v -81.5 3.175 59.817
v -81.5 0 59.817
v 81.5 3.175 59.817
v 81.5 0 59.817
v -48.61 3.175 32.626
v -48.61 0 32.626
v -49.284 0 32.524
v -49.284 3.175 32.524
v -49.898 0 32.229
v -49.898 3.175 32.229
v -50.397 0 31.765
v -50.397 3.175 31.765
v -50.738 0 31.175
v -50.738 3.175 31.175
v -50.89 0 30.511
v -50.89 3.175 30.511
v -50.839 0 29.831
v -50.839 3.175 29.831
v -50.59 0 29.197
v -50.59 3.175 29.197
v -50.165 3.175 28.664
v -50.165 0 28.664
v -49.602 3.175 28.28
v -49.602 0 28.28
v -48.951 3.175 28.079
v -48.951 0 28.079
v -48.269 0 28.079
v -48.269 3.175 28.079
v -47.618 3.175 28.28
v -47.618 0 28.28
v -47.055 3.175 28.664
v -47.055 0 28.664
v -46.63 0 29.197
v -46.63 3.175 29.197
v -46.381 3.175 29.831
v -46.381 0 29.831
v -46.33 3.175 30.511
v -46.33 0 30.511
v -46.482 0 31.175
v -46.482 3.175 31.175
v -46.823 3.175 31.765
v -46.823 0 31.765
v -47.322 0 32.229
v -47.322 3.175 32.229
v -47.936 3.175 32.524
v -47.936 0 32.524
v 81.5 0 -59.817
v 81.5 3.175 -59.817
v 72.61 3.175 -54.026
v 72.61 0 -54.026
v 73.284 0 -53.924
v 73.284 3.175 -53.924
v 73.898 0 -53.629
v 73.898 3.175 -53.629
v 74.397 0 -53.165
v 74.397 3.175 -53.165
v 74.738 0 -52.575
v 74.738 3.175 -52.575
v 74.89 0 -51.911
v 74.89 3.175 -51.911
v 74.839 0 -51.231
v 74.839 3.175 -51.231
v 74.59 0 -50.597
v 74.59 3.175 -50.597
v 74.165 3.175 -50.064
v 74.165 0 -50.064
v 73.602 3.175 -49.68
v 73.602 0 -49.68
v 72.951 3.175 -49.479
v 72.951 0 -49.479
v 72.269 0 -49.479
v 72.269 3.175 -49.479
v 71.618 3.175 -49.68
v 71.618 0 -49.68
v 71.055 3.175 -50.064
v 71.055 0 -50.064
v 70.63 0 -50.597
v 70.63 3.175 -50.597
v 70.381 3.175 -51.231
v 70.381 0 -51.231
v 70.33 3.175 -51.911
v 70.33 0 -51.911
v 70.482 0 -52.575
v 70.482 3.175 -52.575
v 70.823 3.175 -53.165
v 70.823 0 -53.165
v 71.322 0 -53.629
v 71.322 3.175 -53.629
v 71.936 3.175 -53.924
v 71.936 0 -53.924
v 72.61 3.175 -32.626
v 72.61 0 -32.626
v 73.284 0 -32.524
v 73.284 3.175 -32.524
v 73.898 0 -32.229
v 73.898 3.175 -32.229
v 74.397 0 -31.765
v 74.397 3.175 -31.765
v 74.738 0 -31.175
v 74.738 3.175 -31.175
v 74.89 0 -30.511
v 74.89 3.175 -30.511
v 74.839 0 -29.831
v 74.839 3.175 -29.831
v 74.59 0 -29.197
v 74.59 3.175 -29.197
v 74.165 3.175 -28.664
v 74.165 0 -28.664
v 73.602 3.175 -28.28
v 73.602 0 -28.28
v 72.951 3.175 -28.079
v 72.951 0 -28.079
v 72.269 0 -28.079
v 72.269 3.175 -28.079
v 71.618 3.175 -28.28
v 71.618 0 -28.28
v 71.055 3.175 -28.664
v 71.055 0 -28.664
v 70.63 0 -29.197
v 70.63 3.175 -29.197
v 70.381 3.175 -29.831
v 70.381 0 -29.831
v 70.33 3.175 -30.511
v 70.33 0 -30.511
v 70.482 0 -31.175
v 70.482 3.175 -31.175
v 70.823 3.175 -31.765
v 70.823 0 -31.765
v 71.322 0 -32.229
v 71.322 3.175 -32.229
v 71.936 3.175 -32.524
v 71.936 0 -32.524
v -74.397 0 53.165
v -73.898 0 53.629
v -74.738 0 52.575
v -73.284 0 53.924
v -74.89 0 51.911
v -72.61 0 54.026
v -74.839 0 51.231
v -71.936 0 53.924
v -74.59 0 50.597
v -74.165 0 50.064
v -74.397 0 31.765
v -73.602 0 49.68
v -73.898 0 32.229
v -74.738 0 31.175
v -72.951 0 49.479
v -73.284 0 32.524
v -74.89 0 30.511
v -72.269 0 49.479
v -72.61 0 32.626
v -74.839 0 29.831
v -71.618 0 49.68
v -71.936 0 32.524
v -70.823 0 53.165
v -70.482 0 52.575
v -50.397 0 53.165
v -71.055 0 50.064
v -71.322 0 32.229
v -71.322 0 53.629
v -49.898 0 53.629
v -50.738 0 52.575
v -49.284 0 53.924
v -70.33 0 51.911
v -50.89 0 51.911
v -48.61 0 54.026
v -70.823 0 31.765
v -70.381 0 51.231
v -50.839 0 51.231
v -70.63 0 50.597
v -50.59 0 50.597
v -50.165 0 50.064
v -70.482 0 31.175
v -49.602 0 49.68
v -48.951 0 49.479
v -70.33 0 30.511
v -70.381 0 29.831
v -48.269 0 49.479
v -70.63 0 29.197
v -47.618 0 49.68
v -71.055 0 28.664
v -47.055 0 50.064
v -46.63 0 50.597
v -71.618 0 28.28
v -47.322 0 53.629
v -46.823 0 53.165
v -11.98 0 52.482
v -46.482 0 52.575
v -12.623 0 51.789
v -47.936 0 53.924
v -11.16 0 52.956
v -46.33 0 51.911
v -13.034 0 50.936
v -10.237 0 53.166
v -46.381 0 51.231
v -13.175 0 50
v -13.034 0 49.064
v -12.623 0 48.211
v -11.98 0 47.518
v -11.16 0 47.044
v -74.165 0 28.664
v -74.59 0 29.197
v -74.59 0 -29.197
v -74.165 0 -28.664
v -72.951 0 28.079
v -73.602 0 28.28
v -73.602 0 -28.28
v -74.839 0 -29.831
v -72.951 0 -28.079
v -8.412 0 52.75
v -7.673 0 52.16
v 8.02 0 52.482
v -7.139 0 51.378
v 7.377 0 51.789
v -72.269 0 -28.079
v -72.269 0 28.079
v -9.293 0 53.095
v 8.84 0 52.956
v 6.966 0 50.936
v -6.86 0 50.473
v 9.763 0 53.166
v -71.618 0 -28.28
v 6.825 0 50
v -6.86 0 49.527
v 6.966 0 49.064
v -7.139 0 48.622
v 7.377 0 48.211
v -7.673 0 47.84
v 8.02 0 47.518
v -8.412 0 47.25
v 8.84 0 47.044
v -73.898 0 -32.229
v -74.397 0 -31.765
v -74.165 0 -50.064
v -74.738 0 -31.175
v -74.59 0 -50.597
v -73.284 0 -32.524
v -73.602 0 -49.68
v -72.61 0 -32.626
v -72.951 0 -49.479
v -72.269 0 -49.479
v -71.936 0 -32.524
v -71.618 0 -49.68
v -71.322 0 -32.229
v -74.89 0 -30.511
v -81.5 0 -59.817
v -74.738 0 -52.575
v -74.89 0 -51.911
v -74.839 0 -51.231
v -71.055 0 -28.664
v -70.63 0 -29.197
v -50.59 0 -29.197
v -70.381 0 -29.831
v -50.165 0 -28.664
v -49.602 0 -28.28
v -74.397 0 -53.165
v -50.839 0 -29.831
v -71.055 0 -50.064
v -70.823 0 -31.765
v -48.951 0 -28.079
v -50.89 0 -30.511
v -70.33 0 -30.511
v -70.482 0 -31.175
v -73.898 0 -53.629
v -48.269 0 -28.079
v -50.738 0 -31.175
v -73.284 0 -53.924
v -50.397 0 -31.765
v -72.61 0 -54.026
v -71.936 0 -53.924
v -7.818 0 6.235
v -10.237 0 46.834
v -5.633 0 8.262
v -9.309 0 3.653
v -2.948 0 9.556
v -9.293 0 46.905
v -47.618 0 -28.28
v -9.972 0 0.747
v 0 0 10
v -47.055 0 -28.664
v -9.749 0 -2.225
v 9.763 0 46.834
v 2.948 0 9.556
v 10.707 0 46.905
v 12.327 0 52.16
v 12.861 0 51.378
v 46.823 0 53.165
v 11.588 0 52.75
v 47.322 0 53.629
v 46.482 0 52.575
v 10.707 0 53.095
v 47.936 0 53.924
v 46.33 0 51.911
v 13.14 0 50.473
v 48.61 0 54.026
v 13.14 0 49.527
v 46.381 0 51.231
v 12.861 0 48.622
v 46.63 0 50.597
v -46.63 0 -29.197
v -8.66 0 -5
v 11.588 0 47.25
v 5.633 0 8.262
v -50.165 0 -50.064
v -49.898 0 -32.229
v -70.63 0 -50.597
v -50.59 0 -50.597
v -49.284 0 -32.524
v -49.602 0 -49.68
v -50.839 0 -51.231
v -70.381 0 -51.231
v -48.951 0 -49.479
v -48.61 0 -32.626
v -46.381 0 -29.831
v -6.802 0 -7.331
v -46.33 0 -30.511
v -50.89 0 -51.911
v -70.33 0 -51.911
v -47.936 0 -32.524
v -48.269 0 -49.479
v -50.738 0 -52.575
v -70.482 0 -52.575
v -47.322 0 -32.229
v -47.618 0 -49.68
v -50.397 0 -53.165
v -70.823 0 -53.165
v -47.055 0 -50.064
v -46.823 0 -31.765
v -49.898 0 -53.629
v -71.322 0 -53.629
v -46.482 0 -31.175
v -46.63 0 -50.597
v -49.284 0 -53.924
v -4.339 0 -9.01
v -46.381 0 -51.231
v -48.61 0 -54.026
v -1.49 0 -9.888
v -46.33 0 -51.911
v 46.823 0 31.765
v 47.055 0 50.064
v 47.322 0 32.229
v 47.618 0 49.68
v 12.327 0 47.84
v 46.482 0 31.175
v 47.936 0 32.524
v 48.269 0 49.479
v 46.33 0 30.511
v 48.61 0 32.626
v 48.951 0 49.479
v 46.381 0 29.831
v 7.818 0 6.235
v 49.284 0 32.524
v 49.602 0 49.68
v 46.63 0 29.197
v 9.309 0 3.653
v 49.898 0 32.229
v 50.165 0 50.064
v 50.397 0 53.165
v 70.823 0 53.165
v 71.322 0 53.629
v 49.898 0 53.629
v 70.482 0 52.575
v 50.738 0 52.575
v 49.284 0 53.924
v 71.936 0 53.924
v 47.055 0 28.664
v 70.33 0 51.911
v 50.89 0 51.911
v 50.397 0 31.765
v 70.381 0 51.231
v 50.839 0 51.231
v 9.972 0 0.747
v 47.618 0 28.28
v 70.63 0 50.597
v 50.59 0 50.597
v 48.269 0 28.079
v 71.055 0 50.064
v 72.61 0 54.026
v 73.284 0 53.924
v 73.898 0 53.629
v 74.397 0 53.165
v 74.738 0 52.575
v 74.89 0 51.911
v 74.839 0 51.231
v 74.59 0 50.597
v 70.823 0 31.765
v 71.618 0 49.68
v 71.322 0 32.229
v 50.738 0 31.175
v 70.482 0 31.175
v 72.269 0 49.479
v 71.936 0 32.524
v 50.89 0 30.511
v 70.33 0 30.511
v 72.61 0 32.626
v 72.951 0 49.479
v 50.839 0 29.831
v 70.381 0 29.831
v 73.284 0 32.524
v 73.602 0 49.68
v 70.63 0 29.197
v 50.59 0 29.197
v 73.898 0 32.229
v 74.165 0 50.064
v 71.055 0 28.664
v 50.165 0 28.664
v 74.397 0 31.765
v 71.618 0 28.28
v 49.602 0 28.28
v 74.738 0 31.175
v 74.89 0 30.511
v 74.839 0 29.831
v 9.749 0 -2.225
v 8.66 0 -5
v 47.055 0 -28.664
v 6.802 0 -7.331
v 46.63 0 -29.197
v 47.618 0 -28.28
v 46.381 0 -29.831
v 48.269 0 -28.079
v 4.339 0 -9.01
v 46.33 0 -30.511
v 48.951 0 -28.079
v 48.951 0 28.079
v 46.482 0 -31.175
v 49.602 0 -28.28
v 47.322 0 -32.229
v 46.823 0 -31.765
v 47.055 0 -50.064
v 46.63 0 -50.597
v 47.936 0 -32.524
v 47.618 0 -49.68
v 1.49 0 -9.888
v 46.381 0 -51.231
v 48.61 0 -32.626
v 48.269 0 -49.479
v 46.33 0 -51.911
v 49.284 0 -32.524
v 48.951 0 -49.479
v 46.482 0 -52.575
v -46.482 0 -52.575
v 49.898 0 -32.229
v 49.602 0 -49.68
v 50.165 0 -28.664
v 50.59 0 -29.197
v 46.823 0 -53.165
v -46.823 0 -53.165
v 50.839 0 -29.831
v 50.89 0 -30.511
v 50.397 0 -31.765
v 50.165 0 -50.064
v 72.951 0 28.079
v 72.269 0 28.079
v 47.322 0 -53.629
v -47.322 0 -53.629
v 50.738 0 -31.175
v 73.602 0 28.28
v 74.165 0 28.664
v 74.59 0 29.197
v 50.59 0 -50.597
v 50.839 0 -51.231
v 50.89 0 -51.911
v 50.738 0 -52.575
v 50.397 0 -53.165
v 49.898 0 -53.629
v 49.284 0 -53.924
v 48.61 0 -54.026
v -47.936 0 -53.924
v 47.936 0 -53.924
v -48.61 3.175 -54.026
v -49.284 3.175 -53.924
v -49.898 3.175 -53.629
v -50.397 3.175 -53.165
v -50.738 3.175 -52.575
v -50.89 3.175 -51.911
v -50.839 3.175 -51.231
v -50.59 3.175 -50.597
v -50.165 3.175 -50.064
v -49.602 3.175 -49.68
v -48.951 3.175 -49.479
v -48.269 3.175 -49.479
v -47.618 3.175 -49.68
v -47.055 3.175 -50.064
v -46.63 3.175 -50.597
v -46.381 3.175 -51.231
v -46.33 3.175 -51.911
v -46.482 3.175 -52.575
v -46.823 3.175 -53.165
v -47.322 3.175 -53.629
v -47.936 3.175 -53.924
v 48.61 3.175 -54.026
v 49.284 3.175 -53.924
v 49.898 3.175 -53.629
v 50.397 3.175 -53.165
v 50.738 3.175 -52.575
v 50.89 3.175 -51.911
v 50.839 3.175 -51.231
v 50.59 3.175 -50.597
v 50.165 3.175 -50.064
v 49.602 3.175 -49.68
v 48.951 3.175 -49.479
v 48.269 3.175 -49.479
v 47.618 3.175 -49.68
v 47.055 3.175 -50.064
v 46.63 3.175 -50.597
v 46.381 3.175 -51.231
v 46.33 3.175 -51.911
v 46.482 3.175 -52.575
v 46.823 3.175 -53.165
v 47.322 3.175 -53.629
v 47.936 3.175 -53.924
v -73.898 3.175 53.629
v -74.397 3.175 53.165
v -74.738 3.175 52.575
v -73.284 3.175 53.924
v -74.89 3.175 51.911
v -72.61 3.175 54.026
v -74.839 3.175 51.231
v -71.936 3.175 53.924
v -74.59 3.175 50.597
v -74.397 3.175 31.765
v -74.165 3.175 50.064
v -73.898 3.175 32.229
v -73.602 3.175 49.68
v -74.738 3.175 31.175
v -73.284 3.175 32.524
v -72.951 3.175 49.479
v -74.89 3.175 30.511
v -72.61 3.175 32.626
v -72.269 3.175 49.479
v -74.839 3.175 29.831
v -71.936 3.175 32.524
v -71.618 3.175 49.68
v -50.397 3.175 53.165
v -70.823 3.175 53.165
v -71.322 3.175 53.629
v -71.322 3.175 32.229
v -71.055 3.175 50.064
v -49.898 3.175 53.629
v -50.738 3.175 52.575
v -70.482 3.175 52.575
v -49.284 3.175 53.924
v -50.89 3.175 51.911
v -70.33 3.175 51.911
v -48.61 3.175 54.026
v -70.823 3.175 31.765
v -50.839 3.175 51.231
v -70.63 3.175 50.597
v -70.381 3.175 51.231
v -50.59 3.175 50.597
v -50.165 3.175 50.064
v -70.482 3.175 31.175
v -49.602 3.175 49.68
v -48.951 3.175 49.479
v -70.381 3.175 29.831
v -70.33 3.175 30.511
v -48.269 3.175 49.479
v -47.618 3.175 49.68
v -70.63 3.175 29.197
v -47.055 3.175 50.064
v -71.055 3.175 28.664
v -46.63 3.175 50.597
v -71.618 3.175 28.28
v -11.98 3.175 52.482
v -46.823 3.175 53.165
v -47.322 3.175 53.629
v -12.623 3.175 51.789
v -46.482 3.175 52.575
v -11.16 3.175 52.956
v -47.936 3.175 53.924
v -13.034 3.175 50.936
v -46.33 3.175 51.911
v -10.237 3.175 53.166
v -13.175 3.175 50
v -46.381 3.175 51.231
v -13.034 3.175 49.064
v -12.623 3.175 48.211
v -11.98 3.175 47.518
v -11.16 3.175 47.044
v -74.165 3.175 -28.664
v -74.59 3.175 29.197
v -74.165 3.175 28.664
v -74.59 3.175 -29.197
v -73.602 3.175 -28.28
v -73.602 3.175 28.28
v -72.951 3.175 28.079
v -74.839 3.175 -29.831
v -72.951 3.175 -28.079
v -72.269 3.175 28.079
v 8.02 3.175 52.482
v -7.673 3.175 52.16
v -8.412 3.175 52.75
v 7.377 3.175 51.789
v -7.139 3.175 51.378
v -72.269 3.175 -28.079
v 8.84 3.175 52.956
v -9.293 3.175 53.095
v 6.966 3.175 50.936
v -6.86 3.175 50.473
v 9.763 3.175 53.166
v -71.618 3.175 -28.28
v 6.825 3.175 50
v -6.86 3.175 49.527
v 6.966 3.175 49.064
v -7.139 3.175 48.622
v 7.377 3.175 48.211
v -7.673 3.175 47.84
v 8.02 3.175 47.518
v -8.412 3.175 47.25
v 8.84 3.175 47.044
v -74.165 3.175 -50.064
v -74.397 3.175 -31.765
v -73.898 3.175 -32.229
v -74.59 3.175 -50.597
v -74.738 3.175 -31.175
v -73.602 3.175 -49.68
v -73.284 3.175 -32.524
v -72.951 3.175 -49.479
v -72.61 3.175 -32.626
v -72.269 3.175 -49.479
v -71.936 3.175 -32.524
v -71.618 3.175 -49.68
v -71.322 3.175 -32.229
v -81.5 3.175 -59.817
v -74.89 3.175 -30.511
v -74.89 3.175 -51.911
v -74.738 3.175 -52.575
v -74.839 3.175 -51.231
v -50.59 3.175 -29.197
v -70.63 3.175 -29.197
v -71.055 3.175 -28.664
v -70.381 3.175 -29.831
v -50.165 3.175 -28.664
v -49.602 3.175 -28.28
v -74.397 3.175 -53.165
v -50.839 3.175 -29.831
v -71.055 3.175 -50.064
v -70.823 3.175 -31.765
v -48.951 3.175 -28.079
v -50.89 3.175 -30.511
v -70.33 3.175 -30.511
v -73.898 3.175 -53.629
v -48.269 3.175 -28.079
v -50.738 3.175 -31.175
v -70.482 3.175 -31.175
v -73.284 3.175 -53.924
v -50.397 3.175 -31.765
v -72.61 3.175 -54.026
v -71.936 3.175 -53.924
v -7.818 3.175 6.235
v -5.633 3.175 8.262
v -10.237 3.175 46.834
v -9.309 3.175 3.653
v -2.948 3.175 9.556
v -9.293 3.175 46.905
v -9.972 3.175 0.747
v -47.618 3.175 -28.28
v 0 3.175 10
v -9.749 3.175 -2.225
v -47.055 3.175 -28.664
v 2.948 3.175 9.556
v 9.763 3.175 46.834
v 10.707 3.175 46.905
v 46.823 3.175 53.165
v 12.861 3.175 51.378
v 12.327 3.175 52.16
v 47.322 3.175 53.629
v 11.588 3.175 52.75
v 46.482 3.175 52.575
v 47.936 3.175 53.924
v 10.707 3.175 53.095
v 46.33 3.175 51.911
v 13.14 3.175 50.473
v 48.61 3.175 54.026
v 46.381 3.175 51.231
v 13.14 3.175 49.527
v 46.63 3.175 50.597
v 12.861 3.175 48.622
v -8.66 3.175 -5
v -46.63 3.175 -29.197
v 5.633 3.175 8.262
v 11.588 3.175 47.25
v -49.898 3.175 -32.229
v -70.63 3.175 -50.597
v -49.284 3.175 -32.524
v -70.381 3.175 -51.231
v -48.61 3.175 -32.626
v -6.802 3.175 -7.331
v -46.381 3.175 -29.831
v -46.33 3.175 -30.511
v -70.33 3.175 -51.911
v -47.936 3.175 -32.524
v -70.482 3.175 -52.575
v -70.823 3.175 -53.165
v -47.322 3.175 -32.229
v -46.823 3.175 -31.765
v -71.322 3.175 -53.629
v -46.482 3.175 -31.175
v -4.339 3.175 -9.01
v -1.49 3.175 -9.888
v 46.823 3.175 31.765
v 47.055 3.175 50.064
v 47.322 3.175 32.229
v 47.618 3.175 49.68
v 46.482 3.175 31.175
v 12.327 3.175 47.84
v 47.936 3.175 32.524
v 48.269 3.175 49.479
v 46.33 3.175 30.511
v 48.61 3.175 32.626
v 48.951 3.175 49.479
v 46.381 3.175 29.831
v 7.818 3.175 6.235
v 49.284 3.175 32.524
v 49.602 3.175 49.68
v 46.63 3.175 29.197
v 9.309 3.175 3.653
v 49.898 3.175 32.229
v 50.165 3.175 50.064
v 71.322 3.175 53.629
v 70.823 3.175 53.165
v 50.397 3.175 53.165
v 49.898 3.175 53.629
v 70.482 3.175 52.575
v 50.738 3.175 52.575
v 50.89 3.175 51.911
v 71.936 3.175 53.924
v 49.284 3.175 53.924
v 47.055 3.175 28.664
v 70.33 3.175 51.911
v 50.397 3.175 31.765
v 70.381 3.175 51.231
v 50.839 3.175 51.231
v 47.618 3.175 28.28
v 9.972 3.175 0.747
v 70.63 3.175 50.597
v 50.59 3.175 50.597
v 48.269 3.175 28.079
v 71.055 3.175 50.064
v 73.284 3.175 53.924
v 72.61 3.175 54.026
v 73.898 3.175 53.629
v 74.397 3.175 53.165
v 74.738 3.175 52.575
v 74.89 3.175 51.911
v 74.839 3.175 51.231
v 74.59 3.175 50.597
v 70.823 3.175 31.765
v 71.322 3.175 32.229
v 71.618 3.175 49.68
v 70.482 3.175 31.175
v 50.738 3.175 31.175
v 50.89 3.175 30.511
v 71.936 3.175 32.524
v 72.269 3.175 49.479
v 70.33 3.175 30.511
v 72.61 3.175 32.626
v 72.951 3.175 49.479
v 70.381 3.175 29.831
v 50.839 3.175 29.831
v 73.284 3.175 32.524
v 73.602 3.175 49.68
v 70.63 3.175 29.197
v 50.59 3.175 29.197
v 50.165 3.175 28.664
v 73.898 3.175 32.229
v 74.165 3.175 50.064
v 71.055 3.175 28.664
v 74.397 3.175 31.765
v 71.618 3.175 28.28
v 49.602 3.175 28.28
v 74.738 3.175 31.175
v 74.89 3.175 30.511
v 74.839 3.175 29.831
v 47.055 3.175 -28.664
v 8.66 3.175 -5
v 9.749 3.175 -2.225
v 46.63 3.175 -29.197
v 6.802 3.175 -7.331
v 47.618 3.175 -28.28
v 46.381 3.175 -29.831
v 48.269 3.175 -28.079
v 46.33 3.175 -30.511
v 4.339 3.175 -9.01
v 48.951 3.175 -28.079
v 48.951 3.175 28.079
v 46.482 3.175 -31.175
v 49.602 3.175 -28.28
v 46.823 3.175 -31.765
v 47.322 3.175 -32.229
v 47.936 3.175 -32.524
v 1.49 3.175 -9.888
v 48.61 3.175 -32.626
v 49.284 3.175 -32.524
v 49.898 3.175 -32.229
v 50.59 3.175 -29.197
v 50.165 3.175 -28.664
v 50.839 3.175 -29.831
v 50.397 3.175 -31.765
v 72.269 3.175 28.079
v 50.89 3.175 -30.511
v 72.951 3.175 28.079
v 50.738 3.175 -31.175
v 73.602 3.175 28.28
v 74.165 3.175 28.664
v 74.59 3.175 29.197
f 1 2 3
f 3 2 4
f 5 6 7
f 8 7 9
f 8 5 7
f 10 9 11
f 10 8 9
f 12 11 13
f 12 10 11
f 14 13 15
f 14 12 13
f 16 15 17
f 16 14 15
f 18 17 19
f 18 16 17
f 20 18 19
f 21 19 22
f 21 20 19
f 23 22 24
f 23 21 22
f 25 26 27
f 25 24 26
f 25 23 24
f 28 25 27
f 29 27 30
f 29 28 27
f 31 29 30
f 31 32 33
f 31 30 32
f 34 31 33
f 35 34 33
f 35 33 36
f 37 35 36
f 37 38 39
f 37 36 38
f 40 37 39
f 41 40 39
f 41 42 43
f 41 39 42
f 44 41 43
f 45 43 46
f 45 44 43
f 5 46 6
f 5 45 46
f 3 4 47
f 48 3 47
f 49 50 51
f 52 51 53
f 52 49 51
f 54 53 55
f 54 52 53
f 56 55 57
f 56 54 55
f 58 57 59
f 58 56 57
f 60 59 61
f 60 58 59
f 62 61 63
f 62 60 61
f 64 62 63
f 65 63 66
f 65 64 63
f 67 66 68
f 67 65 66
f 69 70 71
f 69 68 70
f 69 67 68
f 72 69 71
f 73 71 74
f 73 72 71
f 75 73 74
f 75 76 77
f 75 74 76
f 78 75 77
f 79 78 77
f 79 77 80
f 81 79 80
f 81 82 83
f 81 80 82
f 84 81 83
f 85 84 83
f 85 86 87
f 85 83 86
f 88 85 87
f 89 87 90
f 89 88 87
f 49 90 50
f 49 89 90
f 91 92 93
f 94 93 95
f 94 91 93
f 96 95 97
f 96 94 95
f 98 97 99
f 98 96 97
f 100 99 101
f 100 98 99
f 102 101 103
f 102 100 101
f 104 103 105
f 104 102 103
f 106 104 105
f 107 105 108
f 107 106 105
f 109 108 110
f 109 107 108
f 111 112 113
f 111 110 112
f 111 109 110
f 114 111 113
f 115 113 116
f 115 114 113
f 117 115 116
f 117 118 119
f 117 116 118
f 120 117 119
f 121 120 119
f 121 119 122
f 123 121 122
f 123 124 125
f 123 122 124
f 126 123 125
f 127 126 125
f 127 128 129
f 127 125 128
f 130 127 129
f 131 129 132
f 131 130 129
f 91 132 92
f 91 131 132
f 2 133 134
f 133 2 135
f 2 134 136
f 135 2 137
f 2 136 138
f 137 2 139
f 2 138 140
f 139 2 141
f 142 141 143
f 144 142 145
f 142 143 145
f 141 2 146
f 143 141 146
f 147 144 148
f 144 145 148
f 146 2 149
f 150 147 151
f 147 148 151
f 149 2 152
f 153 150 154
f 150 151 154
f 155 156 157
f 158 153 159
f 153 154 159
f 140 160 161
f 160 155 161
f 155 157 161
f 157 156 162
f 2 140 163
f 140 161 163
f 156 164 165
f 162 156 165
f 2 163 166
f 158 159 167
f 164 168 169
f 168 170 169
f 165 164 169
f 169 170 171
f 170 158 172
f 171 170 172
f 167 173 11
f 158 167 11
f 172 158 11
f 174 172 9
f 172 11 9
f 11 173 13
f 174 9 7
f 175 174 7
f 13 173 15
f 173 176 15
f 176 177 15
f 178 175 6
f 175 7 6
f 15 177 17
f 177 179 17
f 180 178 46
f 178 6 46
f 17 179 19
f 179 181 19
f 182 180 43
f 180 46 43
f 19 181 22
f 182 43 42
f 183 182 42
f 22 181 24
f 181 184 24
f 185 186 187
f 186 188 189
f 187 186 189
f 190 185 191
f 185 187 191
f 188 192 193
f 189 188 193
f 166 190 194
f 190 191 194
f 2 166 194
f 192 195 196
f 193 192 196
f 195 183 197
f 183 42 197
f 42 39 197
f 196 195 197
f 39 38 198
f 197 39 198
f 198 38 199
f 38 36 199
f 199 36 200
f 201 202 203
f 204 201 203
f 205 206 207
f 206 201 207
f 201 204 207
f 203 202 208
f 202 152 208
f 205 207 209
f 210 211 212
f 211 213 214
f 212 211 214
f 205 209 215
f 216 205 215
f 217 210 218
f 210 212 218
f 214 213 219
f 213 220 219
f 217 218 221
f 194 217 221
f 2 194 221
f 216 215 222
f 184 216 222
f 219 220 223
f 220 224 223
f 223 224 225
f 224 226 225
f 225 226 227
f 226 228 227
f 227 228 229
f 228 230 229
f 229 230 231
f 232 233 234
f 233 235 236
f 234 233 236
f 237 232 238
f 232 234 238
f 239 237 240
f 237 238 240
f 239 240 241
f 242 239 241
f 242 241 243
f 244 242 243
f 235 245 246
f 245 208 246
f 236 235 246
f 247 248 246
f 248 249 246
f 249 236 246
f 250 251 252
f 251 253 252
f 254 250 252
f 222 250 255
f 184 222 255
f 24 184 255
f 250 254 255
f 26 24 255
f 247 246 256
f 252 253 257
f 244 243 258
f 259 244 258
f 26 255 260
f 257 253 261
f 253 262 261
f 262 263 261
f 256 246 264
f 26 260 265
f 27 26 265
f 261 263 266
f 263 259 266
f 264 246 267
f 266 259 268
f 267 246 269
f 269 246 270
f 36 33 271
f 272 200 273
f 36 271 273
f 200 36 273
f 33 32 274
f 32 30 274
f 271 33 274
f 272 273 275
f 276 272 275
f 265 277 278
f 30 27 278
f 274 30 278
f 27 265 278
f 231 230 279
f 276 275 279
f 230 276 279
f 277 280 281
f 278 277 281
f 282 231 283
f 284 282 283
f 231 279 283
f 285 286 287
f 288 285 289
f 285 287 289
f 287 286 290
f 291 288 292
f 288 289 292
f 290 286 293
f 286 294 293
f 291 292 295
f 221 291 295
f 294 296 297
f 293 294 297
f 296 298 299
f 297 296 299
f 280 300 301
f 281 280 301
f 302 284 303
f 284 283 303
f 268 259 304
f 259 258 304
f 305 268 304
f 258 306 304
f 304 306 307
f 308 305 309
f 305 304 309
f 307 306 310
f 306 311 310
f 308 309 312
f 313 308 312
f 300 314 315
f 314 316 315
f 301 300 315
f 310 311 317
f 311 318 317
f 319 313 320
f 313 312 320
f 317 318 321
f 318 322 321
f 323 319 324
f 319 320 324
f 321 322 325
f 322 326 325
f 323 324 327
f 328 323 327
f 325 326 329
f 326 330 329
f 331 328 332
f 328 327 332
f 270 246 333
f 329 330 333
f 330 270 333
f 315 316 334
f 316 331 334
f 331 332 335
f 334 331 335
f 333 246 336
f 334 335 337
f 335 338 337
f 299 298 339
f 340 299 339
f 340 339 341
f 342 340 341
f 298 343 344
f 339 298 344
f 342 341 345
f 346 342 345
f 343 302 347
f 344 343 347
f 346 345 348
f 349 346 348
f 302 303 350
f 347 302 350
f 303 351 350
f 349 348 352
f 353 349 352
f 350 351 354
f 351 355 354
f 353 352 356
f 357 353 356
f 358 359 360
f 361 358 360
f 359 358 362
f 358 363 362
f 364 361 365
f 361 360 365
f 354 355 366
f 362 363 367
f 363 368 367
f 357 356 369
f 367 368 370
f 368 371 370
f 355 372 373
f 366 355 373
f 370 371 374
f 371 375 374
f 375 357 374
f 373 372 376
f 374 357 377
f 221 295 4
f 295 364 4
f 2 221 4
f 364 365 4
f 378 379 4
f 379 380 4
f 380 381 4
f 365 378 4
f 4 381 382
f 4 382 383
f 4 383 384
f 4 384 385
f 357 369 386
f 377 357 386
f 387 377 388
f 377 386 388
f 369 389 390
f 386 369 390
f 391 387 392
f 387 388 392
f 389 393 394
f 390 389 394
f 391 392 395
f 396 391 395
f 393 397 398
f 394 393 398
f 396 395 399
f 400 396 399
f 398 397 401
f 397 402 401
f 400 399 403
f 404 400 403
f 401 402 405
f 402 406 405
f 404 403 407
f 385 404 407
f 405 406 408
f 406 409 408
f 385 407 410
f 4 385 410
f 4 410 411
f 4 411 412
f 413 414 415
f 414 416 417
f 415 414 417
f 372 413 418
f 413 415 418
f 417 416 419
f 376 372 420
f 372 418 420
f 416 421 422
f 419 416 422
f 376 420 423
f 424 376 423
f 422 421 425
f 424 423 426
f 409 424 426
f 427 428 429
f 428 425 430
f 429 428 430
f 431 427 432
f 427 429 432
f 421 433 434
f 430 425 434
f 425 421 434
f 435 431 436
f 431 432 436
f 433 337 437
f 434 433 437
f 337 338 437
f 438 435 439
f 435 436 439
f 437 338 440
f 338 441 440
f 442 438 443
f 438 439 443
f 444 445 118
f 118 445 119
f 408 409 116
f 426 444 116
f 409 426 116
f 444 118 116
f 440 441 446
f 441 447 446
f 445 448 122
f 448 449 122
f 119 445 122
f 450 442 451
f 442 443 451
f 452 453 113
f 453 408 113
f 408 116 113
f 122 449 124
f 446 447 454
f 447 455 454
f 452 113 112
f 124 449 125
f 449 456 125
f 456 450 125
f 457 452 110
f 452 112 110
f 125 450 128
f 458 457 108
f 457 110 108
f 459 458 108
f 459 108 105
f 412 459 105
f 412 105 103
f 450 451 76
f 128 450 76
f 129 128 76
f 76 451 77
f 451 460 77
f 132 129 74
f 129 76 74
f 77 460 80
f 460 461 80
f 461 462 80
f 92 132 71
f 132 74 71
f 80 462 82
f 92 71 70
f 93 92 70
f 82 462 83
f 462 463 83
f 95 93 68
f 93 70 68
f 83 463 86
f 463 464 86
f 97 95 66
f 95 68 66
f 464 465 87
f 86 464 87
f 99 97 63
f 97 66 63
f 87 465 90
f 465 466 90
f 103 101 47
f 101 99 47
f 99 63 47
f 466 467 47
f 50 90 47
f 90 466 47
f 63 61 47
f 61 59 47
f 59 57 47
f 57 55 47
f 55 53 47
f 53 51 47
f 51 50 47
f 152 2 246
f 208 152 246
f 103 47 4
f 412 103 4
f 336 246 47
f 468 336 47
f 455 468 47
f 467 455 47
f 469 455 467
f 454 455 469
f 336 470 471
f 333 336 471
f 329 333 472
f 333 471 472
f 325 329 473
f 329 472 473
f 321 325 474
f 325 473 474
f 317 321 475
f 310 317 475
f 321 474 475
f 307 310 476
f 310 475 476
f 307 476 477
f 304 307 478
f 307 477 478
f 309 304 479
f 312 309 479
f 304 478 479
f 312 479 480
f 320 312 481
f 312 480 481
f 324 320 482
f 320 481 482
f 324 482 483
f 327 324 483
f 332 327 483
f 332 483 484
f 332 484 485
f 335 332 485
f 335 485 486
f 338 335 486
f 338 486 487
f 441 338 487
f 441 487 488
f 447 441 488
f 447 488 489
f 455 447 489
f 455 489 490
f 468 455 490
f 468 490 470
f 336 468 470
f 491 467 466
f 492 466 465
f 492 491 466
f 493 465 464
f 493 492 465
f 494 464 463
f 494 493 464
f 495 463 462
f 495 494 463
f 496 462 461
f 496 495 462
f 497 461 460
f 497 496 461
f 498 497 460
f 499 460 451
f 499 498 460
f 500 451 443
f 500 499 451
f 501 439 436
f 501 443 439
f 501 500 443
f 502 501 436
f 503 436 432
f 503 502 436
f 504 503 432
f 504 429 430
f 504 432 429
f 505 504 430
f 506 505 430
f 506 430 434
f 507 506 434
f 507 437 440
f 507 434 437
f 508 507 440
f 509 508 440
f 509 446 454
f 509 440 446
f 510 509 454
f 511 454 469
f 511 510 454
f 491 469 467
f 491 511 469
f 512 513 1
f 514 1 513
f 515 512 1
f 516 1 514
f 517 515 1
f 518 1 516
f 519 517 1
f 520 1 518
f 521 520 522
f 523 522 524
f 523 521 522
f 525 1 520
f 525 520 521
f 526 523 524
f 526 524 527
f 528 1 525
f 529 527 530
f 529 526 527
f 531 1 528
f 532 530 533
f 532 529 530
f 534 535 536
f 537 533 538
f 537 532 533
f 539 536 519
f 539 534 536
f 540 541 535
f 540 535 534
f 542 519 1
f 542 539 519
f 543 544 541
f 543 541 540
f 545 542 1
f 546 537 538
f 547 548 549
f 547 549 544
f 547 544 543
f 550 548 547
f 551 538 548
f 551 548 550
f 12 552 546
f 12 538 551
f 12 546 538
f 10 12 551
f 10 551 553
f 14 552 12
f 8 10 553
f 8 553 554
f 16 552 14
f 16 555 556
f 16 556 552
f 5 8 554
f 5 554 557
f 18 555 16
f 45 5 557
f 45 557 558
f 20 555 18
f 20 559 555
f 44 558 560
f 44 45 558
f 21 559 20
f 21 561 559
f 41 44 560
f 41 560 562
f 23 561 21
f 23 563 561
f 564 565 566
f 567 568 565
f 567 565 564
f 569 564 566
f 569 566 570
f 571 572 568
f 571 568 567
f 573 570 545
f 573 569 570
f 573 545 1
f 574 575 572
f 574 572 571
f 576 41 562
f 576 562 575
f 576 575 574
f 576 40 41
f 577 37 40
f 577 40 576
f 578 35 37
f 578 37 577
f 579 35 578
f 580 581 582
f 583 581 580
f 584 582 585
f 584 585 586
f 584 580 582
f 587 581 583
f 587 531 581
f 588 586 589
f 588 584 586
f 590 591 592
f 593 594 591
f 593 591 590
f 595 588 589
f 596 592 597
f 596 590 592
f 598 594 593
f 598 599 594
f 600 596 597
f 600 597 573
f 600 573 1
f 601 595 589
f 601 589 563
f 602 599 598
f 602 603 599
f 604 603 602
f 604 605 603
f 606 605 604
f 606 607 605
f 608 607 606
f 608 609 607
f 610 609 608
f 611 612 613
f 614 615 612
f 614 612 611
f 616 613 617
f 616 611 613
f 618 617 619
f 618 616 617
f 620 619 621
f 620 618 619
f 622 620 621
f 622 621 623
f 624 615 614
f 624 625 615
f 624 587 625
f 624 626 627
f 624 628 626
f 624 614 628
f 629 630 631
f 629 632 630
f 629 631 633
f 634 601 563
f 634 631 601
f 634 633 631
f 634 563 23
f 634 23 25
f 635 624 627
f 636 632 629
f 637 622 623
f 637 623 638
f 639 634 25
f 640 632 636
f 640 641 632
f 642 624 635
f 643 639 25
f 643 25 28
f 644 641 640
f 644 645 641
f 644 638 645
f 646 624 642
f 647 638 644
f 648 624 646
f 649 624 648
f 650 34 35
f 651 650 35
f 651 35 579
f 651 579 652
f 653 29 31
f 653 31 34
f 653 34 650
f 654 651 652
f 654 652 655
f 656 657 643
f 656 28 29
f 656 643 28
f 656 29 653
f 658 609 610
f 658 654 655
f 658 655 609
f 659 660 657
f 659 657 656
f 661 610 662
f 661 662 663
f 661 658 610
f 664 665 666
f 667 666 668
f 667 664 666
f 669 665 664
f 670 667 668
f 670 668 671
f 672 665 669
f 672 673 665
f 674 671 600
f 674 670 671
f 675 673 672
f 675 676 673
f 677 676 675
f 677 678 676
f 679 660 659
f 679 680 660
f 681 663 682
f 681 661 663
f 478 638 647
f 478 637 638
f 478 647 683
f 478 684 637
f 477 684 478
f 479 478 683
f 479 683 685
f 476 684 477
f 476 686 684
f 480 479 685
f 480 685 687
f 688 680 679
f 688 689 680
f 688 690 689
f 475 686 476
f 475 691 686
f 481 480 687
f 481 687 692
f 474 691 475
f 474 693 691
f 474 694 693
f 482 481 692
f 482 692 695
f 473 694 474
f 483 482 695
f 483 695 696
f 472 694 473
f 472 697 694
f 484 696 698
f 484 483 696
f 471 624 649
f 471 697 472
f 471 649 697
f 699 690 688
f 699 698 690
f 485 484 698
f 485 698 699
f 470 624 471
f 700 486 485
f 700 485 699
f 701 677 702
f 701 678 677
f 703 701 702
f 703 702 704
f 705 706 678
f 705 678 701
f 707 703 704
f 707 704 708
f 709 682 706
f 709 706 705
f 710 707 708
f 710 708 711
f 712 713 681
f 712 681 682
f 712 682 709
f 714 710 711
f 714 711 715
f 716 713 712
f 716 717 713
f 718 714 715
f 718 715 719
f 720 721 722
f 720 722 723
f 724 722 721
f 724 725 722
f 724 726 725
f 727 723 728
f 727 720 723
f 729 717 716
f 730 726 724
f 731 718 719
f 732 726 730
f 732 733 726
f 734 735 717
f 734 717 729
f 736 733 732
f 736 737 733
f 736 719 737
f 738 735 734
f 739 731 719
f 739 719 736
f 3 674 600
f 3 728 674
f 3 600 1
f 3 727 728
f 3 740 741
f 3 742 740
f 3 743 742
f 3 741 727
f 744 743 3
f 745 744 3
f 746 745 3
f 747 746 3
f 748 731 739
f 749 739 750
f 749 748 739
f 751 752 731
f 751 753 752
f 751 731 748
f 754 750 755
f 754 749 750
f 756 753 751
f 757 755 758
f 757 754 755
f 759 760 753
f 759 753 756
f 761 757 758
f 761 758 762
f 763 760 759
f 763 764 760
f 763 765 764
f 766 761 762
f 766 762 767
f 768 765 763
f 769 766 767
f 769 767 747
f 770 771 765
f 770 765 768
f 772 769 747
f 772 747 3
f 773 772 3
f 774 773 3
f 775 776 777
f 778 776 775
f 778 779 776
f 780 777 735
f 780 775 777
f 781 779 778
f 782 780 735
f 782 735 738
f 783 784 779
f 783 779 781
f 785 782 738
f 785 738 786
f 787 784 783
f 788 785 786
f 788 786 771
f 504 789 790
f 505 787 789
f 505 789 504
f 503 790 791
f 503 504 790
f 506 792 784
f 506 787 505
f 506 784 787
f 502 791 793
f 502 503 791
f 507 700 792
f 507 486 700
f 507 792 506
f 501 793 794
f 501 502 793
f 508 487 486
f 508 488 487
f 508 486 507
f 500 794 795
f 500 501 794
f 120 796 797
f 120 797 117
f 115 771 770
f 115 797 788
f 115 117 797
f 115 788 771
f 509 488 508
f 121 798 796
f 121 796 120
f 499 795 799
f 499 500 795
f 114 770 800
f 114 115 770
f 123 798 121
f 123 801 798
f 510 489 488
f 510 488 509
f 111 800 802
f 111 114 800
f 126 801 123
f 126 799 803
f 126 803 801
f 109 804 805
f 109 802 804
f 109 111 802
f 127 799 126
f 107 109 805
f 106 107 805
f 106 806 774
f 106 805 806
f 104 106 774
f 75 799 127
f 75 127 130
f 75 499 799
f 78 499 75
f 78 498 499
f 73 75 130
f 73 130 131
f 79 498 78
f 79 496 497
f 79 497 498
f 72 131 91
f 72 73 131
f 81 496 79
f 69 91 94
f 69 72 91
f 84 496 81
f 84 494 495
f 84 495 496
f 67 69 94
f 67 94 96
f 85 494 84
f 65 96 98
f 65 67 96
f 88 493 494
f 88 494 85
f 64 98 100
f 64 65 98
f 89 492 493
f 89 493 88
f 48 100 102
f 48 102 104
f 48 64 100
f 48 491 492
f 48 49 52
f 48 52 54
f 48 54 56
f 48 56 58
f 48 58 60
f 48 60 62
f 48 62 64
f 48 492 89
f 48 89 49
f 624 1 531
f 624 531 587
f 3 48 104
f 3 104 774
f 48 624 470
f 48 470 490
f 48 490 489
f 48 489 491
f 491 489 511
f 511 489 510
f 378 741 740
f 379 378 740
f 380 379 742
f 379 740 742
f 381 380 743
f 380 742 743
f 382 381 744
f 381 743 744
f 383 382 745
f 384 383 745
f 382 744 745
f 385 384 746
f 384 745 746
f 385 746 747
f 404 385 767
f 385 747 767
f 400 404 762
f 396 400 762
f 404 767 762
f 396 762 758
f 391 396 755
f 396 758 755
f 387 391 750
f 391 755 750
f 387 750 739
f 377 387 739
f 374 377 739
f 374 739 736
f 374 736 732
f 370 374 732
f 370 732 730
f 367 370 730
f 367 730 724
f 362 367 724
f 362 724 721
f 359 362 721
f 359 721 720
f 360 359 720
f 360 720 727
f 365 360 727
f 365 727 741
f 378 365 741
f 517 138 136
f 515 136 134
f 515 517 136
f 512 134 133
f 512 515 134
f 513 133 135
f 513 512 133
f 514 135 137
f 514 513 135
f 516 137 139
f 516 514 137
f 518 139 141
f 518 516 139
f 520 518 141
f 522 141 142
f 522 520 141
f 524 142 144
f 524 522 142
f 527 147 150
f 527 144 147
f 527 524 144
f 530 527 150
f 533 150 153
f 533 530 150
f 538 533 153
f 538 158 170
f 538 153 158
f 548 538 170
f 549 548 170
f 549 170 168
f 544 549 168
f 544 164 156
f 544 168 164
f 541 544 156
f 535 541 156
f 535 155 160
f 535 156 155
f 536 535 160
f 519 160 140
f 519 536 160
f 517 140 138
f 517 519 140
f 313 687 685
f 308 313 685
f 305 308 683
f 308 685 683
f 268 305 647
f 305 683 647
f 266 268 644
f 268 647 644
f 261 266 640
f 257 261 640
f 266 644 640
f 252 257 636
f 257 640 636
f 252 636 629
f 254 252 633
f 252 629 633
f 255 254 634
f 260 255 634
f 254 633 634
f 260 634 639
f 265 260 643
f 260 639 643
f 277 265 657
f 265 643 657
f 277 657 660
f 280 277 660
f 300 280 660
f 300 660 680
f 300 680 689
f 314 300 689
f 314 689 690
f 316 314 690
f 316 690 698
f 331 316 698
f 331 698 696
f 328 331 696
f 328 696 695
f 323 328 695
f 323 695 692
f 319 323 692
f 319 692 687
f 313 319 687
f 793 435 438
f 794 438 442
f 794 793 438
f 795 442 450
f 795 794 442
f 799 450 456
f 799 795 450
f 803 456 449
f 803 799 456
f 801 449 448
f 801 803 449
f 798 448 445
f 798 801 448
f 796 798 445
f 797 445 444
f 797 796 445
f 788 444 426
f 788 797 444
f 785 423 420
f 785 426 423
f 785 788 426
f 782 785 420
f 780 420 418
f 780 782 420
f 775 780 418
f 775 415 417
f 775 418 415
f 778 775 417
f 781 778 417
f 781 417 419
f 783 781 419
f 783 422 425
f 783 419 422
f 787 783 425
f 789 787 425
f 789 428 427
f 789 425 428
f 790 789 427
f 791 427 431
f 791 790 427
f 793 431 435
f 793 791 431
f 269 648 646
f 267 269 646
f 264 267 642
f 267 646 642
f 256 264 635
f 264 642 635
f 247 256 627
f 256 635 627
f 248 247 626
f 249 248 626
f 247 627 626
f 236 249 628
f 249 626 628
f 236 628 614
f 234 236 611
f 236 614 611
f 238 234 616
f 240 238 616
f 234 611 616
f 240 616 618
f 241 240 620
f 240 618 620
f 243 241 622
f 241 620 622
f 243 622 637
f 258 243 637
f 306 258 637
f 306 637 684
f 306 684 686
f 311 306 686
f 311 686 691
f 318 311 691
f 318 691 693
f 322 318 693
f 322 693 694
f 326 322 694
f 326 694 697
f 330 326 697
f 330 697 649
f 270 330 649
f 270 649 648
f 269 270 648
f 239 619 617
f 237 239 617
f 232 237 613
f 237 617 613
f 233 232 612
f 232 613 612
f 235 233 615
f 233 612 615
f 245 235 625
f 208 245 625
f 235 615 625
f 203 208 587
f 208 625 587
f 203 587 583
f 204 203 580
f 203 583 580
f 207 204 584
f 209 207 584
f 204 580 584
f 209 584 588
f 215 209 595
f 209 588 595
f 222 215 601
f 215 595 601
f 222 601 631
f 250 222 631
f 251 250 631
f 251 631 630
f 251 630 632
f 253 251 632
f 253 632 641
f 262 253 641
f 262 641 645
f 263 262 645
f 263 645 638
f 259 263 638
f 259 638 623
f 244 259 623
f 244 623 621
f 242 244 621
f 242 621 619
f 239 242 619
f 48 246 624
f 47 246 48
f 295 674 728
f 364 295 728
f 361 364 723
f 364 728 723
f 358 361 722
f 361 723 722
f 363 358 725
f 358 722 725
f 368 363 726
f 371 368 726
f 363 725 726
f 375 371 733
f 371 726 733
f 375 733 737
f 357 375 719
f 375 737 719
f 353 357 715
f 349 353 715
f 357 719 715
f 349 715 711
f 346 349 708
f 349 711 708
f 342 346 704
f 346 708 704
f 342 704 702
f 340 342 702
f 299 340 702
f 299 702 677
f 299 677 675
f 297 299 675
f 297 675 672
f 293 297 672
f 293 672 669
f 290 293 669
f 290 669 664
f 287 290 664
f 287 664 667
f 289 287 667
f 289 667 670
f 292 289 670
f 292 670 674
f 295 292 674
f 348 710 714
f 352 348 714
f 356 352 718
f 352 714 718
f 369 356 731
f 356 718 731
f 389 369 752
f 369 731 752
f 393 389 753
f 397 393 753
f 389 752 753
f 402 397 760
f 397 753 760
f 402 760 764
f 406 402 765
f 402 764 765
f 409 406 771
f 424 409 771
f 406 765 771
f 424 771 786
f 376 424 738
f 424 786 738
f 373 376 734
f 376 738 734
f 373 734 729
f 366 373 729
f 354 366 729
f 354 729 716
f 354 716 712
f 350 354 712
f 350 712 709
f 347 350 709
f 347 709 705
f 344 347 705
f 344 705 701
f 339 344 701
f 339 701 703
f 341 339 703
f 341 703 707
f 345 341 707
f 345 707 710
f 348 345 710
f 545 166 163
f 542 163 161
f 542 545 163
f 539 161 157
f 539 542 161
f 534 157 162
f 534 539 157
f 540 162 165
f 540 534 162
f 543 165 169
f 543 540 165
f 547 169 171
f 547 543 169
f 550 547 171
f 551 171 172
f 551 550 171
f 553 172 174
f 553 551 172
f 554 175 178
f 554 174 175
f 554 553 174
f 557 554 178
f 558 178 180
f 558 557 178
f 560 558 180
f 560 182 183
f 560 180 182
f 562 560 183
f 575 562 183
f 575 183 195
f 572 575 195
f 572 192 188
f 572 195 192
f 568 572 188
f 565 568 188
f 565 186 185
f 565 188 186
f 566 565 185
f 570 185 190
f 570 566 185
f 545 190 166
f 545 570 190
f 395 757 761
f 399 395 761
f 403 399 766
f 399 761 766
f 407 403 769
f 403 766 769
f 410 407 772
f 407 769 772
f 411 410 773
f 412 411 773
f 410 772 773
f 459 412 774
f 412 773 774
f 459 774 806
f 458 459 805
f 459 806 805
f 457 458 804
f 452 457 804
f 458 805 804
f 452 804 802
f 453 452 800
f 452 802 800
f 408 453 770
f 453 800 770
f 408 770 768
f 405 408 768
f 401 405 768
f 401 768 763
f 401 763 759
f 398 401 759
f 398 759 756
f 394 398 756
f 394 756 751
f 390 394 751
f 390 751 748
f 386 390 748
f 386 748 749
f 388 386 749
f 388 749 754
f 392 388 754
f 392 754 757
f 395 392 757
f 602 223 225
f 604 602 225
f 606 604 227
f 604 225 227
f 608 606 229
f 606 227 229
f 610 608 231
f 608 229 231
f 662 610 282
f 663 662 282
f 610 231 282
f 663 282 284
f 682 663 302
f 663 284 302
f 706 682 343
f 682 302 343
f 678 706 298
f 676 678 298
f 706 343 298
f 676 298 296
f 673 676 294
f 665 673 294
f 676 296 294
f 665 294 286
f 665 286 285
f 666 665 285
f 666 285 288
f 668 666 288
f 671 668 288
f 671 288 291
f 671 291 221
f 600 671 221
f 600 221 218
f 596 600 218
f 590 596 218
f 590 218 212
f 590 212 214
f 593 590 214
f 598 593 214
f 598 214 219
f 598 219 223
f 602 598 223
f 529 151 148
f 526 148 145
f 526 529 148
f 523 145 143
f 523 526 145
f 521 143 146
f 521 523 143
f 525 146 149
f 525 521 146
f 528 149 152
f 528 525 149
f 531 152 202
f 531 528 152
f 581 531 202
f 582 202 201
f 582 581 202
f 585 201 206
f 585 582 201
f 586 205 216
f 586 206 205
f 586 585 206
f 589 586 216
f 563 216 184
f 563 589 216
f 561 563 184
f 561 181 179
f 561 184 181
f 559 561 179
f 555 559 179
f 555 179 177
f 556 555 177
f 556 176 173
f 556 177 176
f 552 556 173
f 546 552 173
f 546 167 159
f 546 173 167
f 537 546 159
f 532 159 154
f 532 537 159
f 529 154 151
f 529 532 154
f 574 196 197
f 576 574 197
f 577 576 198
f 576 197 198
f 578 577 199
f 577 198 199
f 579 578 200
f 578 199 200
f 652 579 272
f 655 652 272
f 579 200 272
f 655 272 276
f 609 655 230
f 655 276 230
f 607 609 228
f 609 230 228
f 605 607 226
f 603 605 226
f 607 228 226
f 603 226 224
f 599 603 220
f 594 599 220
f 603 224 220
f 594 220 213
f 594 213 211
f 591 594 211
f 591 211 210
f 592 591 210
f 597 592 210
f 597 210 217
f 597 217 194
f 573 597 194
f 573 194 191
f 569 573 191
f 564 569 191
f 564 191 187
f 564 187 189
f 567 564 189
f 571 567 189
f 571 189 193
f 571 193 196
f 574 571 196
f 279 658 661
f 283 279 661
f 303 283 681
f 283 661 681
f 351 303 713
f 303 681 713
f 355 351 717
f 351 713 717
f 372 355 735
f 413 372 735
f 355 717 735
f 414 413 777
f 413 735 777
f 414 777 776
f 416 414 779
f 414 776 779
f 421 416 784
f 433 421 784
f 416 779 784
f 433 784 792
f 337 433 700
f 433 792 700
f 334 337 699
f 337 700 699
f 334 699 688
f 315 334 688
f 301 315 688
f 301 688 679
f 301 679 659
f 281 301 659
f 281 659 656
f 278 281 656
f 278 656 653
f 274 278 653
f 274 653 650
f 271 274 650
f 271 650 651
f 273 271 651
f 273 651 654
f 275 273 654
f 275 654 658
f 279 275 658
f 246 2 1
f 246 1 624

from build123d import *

# Parameters (mm, degrees)
SKETCH1_W                      = 163
SKETCH1_H                      = 119.634
BOSS_EXTRUDE1_DEPTH            = 3.175
SKETCH2_R                      = 2.286
CUT_EXTRUDE1_DEPTH             = 102.145460175
MIRROR2_COPY_1_SKETCH_R        = 2.286
MIRROR2_COPY_1_DEPTH           = 102.145460175
SKETCH3_R                      = 10
CUT_EXTRUDE2_DEPTH             = 102.145460175
F_1_16_0_0625_DIAMETER_HOLE1_D = 6.35


with BuildPart() as part:
    # Sketch1 → Boss-Extrude1 (new body)
    with BuildSketch(Plane(origin=(0, 0, 0), x_dir=(1, 0, 0), z_dir=(0, 1, 0))):
        Rectangle(SKETCH1_W, SKETCH1_H)
    extrude(amount=BOSS_EXTRUDE1_DEPTH)

    # Sketch2 → Cut-Extrude1 (cut, through all)
    with BuildSketch(Plane(origin=(0, 3.175, 0), x_dir=(1, 0, 0), z_dir=(0, 1, 0))):
        with Locations(Location((72.61, -51.7398, 0), (0, 0, 270))):
            Circle(SKETCH2_R)
        with Locations(Location((48.61, -51.7398, 0), (0, 0, 270))):
            Circle(SKETCH2_R)
        with Locations(Location((48.61, -30.3398, 0), (0, 0, 270))):
            Circle(SKETCH2_R)
        with Locations(Location((72.61, -30.3398, 0), (0, 0, 270))):
            Circle(SKETCH2_R)
    cut_extrude1 = extrude(amount=-CUT_EXTRUDE1_DEPTH, mode=Mode.SUBTRACT)

    # Mirror1: Cut-Extrude1 across plane
    add(cut_extrude1.mirror(Plane.XY), mode=Mode.SUBTRACT)

    # Mirror2: Cut-Extrude1 across plane
    add(cut_extrude1.mirror(Plane(origin=(0, 0, 0), x_dir=(0, 0, 1), z_dir=(1, 0, 0))), mode=Mode.SUBTRACT)

    # Mirror2 copy 1 sketch → Mirror2 copy 1 (cut, through all)
    with BuildSketch(Plane(origin=(0, 3.175, 0), x_dir=(-1, 0, 0), z_dir=(0, 1, 0))):
        with Locations(Location((72.61, -51.7398, 0), (0, 0, 270))):
            Circle(MIRROR2_COPY_1_SKETCH_R)
        with Locations(Location((48.61, -51.7398, 0), (0, 0, 270))):
            Circle(MIRROR2_COPY_1_SKETCH_R)
        with Locations(Location((48.61, -30.3398, 0), (0, 0, 270))):
            Circle(MIRROR2_COPY_1_SKETCH_R)
        with Locations(Location((72.61, -30.3398, 0), (0, 0, 270))):
            Circle(MIRROR2_COPY_1_SKETCH_R)
    extrude(amount=-MIRROR2_COPY_1_DEPTH, mode=Mode.SUBTRACT)

    # Sketch3 → Cut-Extrude2 (cut, through all)
    with BuildSketch(Plane(origin=(0, 3.175, 0), x_dir=(1, 0, 0), z_dir=(0, 1, 0))):
        with Locations(Location((0, 0, 0), (0, 0, 270))):
            Circle(SKETCH3_R)
    extrude(amount=-CUT_EXTRUDE2_DEPTH, mode=Mode.SUBTRACT)

    # 1/16 (0.0625) Diameter Hole1 (through all)
    with Locations(Plane(origin=(0, 3.175, 0), x_dir=(1, 0, 0), z_dir=(0, 1, 0))):
        with Locations((-10, -50), (10, -50)):
            Hole(F_1_16_0_0625_DIAMETER_HOLE1_D / 2)


solid = part.part
